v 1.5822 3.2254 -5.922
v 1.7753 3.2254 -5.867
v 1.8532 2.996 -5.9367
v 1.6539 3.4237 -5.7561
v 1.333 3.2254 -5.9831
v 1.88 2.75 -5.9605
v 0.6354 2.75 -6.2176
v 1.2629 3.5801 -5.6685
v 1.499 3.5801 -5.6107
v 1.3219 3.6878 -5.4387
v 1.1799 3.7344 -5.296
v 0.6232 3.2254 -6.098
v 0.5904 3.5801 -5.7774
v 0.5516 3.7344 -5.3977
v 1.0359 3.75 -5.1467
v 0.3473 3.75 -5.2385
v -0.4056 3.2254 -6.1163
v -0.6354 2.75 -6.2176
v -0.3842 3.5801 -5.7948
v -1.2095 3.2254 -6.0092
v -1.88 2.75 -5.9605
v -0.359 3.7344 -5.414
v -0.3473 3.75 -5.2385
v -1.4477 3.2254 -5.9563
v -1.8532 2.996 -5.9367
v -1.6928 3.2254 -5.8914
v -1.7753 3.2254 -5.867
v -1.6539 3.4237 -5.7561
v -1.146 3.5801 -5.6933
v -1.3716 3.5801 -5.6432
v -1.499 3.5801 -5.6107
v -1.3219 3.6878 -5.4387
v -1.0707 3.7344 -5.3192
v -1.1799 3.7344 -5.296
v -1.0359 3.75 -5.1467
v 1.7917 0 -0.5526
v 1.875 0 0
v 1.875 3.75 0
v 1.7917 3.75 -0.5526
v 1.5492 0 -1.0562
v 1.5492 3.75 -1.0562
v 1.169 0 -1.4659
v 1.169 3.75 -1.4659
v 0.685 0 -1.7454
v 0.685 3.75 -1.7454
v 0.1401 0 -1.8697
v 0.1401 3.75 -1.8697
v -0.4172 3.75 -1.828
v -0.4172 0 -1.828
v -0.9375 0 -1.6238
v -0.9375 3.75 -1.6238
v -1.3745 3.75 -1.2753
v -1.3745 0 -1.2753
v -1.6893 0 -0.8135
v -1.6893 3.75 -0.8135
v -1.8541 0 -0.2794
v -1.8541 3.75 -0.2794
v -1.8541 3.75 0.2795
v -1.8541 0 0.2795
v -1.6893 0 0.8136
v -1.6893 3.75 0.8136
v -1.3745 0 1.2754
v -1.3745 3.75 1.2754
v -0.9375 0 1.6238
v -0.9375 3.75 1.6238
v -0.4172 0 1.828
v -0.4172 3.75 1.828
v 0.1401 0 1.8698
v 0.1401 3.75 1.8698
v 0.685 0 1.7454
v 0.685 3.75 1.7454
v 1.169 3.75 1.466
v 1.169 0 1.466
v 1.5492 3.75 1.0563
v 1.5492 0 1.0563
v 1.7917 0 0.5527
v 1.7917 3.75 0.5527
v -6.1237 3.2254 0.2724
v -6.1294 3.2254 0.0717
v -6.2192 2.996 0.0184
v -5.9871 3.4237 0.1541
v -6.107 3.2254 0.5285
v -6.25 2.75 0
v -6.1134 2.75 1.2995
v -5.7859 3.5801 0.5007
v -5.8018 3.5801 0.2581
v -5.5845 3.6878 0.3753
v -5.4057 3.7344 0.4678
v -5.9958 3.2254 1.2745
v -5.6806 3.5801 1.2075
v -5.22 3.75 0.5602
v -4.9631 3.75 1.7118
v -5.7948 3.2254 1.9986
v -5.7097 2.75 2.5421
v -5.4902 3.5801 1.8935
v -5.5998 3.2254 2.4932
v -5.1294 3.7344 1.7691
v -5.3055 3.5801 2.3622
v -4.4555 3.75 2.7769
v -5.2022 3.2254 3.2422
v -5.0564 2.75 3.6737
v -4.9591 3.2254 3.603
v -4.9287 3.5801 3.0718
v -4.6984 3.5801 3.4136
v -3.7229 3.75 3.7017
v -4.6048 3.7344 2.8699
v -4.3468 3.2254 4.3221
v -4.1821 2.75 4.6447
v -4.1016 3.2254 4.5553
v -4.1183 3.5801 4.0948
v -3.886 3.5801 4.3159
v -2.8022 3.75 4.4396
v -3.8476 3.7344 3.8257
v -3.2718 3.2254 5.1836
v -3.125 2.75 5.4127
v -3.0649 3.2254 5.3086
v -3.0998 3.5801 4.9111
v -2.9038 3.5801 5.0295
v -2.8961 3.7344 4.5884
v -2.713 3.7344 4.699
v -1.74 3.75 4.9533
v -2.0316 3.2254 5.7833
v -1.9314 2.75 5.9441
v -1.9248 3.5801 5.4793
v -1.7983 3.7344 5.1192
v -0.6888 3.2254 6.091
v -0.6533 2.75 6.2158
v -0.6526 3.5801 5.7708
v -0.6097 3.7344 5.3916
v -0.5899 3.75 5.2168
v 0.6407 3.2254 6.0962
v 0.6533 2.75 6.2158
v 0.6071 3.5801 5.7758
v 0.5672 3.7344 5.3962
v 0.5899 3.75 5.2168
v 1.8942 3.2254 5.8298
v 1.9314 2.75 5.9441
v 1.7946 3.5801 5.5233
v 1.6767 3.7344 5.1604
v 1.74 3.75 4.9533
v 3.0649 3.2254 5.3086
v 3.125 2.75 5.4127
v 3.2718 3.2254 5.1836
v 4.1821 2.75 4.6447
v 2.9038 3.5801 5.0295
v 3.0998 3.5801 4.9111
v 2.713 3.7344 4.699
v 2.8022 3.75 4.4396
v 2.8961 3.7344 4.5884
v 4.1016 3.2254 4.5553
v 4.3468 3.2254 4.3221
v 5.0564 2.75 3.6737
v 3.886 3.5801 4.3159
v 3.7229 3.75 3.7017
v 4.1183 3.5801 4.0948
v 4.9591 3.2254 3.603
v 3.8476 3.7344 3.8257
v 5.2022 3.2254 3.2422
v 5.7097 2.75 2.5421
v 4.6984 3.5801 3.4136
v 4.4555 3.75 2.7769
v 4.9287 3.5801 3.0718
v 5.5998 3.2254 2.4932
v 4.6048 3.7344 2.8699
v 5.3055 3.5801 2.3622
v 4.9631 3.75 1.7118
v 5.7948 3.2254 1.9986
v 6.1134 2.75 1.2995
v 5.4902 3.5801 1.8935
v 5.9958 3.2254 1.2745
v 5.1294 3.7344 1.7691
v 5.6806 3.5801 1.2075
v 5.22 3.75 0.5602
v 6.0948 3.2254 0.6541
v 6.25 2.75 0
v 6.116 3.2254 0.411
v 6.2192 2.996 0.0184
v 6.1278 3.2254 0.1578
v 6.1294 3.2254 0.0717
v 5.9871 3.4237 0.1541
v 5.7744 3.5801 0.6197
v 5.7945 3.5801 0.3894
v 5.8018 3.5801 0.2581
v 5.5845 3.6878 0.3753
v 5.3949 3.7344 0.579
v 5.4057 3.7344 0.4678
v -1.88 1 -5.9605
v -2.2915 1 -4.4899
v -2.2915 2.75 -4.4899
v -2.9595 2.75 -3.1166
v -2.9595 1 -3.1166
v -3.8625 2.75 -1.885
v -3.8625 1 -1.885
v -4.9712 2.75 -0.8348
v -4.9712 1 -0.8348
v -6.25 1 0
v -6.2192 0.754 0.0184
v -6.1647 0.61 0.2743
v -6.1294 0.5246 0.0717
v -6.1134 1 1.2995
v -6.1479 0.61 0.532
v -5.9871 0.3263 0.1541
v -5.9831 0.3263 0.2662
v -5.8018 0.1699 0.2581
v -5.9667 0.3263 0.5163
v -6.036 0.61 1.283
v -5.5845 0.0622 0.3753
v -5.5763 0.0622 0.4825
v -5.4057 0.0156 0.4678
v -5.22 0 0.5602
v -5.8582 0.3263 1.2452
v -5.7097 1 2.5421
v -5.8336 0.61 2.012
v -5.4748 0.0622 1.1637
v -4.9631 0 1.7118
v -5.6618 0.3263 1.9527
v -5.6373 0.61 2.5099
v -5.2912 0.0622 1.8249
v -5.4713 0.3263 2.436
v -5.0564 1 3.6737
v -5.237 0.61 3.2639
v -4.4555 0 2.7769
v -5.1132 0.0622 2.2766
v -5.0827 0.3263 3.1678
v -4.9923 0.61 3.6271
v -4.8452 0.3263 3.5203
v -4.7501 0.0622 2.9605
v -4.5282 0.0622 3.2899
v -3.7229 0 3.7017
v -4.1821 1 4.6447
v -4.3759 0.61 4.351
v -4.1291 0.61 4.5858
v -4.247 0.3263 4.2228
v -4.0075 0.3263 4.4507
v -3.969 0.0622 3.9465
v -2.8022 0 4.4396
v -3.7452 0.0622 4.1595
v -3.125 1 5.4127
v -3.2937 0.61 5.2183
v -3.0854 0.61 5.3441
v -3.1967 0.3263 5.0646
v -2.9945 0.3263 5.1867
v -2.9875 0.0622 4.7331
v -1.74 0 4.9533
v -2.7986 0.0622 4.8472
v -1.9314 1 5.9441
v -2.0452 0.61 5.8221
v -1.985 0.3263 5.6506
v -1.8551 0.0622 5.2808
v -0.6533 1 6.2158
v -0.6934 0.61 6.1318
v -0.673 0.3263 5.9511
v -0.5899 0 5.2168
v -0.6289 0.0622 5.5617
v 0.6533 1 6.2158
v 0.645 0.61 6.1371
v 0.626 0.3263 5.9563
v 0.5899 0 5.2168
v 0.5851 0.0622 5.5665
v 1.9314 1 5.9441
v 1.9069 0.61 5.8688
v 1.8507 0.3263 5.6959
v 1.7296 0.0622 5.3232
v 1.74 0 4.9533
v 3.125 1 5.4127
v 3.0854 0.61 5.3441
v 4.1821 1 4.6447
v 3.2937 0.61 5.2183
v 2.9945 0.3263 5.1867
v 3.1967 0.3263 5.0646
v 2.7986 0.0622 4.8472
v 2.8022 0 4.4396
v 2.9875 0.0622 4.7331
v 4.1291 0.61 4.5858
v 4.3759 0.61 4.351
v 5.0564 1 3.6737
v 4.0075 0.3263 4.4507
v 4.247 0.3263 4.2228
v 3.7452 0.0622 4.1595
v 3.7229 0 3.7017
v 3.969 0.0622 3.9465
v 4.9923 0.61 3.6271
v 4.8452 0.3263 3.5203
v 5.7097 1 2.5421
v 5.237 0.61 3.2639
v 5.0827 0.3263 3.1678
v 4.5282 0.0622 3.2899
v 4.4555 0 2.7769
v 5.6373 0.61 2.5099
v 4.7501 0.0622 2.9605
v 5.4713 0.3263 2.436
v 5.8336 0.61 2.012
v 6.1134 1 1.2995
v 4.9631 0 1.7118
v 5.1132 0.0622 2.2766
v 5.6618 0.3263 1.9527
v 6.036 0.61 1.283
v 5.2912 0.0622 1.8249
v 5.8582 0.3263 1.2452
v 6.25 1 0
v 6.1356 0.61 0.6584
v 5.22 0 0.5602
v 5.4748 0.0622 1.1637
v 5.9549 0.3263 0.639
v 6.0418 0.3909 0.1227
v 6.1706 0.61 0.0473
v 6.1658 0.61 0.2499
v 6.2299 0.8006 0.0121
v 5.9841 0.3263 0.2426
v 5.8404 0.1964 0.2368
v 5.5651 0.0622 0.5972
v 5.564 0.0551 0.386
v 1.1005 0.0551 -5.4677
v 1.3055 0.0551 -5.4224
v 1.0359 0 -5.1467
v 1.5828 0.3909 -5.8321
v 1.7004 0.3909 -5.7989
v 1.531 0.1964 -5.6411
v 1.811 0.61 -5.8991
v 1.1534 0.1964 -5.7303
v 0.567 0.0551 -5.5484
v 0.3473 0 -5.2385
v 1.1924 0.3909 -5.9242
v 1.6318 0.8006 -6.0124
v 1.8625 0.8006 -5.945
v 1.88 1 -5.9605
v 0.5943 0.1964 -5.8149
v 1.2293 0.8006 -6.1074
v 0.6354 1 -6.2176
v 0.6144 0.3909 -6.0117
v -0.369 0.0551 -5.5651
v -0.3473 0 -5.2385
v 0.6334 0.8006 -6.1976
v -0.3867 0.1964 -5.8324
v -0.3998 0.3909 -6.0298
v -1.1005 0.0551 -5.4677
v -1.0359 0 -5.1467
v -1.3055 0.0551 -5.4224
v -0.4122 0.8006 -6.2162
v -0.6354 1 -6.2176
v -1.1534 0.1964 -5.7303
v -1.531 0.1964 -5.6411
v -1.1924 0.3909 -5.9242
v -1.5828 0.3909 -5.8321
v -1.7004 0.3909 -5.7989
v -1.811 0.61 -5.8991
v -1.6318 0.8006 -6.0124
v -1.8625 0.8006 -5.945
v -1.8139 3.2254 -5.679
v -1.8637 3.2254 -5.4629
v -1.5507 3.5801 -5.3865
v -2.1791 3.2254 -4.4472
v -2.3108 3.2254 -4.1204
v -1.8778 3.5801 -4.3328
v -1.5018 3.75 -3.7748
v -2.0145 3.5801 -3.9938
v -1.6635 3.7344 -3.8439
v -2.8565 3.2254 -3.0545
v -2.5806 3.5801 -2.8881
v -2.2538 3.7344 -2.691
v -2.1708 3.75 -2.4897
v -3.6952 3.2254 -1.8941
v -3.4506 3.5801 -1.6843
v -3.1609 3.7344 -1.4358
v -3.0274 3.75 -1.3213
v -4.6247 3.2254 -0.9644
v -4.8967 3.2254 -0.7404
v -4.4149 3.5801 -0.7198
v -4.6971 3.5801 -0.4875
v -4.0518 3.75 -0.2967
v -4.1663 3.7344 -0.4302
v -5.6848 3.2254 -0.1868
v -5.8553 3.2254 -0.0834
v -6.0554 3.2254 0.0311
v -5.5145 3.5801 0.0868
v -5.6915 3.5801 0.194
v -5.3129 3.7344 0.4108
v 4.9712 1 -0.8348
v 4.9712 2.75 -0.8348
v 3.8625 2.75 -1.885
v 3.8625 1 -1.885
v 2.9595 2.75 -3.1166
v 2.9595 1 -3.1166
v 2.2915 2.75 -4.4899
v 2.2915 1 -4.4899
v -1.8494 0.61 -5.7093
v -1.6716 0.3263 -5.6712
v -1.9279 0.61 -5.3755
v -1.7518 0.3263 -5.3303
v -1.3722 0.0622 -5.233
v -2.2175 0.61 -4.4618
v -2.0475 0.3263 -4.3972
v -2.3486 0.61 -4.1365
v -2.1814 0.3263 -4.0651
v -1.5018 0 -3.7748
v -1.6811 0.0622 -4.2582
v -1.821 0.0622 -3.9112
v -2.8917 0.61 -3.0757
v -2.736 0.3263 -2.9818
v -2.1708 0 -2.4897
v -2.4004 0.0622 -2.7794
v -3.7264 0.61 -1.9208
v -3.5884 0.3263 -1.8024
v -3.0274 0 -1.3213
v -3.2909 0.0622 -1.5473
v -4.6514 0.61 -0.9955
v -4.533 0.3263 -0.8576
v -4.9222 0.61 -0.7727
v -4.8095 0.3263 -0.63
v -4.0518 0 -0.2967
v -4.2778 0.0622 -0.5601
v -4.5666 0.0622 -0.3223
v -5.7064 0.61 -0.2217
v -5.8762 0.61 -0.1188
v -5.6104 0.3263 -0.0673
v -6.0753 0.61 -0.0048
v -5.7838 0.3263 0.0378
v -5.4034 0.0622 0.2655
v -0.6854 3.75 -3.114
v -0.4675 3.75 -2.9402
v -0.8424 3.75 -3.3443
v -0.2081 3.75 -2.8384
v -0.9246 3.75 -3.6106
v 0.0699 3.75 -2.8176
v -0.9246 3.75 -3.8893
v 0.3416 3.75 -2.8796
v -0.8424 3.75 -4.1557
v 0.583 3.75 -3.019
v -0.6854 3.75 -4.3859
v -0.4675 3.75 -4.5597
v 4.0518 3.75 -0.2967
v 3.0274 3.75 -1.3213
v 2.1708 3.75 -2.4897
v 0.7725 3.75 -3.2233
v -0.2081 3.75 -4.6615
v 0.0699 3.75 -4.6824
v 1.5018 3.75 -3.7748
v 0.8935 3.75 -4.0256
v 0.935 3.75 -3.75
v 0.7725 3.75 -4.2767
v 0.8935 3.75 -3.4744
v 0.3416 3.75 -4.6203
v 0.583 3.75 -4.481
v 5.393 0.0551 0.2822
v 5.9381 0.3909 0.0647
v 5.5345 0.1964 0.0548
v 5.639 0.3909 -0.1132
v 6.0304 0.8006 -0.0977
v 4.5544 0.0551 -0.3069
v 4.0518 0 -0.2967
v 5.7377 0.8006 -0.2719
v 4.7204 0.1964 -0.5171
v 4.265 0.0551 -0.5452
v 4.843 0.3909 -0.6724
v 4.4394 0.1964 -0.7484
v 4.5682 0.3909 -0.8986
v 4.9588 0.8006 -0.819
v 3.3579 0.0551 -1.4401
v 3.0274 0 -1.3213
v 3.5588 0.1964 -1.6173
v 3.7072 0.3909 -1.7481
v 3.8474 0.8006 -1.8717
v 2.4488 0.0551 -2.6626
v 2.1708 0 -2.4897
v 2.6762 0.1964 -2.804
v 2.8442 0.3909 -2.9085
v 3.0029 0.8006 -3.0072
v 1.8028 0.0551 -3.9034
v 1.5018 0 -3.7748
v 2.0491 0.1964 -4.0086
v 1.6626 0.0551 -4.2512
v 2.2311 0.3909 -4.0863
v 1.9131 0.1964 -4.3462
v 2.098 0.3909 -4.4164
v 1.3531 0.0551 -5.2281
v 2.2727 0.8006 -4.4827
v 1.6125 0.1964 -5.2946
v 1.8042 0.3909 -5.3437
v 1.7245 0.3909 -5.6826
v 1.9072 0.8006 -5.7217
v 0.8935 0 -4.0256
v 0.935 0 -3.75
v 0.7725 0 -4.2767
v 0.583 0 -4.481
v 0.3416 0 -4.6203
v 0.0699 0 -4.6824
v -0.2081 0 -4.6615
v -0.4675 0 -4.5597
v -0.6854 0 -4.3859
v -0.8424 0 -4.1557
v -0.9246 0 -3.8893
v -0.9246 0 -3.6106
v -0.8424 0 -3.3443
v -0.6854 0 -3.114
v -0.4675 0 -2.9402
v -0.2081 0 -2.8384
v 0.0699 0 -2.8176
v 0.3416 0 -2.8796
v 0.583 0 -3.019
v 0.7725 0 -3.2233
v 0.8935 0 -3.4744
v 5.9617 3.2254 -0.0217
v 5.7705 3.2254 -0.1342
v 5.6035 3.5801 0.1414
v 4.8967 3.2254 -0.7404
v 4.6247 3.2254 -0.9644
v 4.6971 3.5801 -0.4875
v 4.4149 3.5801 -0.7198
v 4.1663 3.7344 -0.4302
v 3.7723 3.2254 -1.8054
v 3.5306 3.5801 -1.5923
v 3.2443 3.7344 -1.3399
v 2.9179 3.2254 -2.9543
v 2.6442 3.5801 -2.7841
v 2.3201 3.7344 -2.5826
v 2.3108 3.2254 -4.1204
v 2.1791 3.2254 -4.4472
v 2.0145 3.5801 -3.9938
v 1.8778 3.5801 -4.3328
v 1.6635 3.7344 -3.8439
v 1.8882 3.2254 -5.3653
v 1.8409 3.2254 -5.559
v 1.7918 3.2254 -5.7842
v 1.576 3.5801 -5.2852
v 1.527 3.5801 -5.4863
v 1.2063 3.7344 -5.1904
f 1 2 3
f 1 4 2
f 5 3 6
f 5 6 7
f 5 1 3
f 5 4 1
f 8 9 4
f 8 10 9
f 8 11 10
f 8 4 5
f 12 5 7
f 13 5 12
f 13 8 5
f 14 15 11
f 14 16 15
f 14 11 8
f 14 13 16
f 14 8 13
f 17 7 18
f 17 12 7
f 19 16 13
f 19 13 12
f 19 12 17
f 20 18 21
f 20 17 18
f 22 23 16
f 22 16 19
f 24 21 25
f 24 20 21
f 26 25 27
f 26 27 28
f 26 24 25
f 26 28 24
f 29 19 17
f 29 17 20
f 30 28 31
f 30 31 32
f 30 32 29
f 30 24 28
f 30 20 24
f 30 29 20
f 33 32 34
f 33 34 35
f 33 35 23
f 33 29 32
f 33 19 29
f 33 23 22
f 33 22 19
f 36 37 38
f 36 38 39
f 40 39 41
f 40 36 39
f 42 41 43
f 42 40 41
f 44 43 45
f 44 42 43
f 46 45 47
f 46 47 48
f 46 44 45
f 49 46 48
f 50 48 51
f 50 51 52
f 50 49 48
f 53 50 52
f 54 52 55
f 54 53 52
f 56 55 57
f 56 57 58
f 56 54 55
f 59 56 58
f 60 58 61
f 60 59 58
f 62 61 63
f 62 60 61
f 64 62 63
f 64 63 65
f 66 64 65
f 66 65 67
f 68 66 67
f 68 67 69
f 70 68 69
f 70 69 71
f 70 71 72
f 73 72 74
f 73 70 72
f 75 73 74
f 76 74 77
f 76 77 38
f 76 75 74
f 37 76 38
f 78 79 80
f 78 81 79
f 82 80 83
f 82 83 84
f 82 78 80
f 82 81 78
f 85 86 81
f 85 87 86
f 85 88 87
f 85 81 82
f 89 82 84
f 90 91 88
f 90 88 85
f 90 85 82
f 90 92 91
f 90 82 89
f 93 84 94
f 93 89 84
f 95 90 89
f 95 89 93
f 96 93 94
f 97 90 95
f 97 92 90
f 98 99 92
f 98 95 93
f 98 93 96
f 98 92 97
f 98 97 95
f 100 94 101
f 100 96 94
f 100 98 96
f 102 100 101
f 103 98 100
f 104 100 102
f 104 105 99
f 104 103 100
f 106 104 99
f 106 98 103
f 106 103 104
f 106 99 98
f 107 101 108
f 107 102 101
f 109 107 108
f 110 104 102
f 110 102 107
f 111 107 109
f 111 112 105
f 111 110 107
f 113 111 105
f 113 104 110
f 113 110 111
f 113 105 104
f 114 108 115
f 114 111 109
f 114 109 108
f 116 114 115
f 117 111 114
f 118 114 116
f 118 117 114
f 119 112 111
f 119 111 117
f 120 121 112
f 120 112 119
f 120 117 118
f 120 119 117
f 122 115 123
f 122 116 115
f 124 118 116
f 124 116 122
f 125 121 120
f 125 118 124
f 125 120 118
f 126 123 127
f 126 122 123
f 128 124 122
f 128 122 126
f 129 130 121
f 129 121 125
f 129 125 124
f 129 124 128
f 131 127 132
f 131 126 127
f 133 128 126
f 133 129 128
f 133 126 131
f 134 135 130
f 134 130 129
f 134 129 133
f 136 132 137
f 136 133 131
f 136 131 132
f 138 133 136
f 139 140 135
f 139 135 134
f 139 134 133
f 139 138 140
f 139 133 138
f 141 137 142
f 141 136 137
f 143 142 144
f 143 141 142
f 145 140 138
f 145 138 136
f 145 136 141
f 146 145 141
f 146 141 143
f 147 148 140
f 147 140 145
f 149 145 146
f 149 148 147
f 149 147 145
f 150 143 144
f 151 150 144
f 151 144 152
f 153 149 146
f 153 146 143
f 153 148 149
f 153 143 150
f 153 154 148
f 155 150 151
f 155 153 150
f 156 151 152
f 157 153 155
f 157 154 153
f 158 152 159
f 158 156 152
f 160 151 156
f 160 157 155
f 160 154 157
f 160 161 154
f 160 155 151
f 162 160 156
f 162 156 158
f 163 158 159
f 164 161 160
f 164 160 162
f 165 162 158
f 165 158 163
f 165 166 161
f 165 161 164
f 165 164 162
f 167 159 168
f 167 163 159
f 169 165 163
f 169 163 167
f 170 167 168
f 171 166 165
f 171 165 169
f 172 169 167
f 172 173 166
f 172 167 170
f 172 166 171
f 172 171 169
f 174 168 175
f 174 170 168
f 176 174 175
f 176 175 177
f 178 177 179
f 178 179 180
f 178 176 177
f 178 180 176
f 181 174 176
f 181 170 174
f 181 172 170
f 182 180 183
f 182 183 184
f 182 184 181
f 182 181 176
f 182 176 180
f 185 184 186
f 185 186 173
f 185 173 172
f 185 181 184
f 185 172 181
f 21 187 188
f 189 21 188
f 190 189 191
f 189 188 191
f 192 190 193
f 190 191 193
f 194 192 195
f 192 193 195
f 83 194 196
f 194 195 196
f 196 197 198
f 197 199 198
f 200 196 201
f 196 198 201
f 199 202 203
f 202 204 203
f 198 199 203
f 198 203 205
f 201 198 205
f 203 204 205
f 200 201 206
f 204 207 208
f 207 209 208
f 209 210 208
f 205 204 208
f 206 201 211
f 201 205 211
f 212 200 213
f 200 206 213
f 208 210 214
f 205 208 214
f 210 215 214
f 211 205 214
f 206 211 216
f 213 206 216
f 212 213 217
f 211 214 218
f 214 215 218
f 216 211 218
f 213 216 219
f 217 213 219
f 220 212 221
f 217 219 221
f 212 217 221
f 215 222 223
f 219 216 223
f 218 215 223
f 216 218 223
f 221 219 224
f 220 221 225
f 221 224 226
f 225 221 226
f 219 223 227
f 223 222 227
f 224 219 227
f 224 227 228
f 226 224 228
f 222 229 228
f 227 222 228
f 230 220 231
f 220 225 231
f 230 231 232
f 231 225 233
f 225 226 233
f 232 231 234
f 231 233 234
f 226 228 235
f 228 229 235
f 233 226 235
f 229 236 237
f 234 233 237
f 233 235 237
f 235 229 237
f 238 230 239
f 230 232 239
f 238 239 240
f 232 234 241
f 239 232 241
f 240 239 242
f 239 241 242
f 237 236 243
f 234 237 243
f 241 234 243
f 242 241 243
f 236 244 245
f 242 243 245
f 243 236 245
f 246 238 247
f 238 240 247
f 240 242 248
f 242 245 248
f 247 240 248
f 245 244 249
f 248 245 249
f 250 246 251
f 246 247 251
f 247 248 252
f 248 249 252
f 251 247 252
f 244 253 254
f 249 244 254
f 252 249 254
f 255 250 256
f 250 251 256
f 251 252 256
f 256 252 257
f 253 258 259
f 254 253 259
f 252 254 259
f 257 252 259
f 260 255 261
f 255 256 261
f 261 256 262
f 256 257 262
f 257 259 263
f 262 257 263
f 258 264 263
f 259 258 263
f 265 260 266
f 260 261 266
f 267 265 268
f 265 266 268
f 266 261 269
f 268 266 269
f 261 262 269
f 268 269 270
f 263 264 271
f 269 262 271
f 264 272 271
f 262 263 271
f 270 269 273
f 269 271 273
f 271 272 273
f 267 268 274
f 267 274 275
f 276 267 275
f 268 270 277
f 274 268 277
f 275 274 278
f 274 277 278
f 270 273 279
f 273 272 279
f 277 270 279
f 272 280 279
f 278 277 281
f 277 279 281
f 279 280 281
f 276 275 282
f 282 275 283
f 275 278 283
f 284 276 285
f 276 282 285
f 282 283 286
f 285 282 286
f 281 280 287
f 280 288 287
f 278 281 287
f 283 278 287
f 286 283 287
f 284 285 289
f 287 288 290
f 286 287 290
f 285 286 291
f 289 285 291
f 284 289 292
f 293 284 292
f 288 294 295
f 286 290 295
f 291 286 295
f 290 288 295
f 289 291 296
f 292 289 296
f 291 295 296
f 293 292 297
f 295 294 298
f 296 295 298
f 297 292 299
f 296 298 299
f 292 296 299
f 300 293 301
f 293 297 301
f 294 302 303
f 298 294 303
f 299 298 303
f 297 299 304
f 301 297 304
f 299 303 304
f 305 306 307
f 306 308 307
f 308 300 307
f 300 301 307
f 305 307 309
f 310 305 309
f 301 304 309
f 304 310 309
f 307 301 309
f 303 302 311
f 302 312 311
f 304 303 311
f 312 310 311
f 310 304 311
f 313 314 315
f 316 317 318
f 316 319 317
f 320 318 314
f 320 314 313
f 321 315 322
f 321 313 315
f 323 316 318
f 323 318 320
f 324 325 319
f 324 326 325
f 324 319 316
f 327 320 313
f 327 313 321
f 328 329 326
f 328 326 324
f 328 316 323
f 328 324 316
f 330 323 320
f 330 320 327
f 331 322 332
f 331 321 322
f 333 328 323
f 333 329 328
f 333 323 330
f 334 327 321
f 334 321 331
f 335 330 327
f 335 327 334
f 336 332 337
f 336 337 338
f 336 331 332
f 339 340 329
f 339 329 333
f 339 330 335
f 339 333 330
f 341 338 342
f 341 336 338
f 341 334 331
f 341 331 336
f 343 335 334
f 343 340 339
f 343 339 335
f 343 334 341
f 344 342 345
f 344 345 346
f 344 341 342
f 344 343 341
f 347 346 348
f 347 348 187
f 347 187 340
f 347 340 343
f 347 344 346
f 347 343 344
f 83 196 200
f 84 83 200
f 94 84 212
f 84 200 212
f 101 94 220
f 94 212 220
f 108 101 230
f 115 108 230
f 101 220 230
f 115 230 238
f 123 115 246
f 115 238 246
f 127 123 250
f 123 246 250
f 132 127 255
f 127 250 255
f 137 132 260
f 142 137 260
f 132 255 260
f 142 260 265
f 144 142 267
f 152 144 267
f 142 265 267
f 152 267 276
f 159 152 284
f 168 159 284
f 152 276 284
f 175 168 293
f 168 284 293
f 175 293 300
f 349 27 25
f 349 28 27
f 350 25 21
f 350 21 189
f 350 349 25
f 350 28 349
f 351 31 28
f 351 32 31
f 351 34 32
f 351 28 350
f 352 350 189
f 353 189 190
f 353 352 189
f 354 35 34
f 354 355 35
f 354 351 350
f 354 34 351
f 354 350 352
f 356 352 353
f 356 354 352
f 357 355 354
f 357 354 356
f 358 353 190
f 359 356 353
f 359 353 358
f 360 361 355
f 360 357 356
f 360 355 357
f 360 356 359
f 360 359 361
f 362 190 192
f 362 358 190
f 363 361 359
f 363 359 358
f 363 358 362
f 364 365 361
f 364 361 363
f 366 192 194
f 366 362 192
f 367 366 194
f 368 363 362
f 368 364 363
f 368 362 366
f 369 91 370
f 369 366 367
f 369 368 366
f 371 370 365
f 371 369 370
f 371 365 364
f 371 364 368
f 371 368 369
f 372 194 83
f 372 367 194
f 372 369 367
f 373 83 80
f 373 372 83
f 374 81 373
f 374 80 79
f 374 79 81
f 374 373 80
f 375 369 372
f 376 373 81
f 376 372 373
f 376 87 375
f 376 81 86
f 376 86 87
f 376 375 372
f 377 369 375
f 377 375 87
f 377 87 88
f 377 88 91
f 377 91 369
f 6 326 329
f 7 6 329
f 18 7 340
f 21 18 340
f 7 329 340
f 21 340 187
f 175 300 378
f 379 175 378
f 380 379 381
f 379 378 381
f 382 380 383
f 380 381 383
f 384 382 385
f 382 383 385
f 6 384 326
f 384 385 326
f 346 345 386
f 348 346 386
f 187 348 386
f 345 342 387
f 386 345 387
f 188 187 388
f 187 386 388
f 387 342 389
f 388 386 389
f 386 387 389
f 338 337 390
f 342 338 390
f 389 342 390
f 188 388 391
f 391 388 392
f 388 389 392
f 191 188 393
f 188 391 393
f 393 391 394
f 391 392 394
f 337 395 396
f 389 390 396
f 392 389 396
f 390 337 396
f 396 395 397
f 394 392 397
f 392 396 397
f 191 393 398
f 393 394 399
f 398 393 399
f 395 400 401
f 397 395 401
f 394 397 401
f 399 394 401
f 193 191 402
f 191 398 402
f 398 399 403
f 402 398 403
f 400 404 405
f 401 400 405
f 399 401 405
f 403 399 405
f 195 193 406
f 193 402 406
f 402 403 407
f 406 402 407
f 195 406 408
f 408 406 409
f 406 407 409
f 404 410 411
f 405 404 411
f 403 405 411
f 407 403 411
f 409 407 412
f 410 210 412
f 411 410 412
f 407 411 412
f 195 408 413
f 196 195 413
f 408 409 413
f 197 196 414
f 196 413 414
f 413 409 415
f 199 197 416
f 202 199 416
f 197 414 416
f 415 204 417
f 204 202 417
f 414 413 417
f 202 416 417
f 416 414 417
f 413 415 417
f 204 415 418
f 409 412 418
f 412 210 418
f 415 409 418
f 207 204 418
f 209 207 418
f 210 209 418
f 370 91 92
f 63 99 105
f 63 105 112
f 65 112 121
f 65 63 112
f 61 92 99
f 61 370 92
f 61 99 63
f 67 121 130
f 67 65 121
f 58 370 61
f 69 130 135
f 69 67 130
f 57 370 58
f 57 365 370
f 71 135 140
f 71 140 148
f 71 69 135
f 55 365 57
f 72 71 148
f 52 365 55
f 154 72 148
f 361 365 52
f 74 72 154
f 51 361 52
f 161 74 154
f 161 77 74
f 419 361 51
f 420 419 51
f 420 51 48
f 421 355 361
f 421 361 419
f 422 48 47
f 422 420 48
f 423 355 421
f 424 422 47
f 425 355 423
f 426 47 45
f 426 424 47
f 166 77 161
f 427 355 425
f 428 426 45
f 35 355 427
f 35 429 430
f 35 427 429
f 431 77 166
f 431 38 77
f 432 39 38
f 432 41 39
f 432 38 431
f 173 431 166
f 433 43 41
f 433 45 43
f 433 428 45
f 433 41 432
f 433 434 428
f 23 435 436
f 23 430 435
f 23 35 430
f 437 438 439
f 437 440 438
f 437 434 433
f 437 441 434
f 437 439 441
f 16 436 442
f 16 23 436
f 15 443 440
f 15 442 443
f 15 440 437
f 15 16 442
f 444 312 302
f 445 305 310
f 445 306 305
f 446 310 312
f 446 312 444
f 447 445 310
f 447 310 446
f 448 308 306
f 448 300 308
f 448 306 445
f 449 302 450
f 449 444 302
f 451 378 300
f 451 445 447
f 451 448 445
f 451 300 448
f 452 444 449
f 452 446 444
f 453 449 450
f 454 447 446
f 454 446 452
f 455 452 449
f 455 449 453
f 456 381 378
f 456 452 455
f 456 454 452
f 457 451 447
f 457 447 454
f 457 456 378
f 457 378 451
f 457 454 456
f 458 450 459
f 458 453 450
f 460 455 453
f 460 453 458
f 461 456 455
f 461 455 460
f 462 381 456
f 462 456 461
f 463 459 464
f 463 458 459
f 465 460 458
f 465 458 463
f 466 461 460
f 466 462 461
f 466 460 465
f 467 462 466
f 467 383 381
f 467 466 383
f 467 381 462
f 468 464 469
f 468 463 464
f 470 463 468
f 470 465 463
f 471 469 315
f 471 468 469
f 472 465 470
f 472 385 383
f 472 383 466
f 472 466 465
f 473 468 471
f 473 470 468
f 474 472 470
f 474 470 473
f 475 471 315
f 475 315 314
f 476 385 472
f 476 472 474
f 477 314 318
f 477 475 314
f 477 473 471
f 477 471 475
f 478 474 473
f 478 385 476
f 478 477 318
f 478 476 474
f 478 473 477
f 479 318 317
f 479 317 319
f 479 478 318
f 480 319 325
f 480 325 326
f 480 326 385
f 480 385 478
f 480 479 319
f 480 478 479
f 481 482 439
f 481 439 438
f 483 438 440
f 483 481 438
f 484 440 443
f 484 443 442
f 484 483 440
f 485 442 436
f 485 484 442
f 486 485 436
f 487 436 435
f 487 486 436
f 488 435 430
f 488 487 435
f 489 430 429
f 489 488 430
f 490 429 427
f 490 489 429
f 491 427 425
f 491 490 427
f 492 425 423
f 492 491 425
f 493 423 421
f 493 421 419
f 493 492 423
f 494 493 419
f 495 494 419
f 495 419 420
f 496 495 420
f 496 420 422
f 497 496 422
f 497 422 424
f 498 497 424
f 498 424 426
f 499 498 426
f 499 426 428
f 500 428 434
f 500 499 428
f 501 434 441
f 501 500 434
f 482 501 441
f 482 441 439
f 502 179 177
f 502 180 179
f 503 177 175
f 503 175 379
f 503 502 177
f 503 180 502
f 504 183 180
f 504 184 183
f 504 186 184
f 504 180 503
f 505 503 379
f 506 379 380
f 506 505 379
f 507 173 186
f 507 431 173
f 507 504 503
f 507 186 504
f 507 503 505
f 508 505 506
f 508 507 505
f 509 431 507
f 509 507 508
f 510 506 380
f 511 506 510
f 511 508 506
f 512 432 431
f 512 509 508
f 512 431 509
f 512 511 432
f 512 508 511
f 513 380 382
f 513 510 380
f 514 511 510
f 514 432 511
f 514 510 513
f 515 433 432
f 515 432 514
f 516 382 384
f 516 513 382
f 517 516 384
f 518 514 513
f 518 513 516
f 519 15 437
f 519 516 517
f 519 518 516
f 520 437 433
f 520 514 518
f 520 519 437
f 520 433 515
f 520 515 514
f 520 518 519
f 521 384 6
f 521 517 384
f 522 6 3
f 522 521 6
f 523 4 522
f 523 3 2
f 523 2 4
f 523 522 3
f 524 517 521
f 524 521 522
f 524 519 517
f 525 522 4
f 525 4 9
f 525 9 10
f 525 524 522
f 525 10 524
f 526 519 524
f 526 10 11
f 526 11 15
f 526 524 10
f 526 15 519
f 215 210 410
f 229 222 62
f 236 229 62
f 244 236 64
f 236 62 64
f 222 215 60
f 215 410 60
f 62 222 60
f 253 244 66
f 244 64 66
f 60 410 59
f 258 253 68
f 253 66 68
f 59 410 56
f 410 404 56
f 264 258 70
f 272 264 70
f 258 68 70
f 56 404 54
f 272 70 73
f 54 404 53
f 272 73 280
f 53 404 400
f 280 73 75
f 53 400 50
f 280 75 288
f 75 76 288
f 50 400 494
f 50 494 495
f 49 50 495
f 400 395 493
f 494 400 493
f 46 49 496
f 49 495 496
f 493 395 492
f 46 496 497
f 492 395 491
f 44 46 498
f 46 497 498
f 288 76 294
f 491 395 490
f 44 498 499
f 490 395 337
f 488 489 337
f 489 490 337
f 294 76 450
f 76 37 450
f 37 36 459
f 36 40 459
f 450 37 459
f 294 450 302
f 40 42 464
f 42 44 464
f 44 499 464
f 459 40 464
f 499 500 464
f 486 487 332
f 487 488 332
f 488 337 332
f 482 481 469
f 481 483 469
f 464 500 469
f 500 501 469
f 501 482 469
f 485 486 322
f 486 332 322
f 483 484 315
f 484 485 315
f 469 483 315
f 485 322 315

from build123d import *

# Parameters (mm, degrees)
SKETCH1_R           = 1.875
SKETCH1_R_2         = 0.935
BOSS_EXTRUDE1_DEPTH = 3.75
FILLET1_R           = 1
FILLET2_R           = 1


with BuildPart() as part:
    # Sketch1 → Boss-Extrude1 (new body)
    with BuildSketch(Plane(origin=(0, 0, 0), x_dir=(1, 0, 0), z_dir=(0, 1, 0))):
        with BuildLine():
            ThreePointArc((-6.25, 0), (0, -6.250030085), (6.25, 0))
            ThreePointArc((6.25, 0), (3.383257686, 2.480432696), (1.88, 5.960515192))
            ThreePointArc((1.88, 5.960515192), (0, 6.249969915), (-1.88, 5.960515192))
            ThreePointArc((-1.88, 5.960515192), (-3.383257686, 2.480432696), (-6.25, 0))
        make_face()
        with Locations((0, -3.0085e-05)):
            Circle(SKETCH1_R, mode=Mode.SUBTRACT)
        with Locations((0, 3.749969915)):
            Circle(SKETCH1_R_2, mode=Mode.SUBTRACT)
    extrude(amount=BOSS_EXTRUDE1_DEPTH)

    # Fillet1
    fillet1_edges = [part.edges().sort_by_distance(p)[0] for p in [
        (3.383257686, 3.75, -2.480432696),
        (0, 3.75, -6.249969915),
        (-3.383257686, 3.75, -2.480432696),
        (0, 3.75, 6.250030085),
    ]]
    fillet(fillet1_edges, radius=FILLET1_R)

    # Fillet2
    fillet2_edges = [part.edges().sort_by_distance(p)[0] for p in [
        (0, 0, -6.249969915),
        (3.383257686, 0, -2.480432696),
        (0, 0, 6.250030085),
        (-3.383257686, 0, -2.480432696),
    ]]
    fillet(fillet2_edges, radius=FILLET2_R)


solid = part.part
